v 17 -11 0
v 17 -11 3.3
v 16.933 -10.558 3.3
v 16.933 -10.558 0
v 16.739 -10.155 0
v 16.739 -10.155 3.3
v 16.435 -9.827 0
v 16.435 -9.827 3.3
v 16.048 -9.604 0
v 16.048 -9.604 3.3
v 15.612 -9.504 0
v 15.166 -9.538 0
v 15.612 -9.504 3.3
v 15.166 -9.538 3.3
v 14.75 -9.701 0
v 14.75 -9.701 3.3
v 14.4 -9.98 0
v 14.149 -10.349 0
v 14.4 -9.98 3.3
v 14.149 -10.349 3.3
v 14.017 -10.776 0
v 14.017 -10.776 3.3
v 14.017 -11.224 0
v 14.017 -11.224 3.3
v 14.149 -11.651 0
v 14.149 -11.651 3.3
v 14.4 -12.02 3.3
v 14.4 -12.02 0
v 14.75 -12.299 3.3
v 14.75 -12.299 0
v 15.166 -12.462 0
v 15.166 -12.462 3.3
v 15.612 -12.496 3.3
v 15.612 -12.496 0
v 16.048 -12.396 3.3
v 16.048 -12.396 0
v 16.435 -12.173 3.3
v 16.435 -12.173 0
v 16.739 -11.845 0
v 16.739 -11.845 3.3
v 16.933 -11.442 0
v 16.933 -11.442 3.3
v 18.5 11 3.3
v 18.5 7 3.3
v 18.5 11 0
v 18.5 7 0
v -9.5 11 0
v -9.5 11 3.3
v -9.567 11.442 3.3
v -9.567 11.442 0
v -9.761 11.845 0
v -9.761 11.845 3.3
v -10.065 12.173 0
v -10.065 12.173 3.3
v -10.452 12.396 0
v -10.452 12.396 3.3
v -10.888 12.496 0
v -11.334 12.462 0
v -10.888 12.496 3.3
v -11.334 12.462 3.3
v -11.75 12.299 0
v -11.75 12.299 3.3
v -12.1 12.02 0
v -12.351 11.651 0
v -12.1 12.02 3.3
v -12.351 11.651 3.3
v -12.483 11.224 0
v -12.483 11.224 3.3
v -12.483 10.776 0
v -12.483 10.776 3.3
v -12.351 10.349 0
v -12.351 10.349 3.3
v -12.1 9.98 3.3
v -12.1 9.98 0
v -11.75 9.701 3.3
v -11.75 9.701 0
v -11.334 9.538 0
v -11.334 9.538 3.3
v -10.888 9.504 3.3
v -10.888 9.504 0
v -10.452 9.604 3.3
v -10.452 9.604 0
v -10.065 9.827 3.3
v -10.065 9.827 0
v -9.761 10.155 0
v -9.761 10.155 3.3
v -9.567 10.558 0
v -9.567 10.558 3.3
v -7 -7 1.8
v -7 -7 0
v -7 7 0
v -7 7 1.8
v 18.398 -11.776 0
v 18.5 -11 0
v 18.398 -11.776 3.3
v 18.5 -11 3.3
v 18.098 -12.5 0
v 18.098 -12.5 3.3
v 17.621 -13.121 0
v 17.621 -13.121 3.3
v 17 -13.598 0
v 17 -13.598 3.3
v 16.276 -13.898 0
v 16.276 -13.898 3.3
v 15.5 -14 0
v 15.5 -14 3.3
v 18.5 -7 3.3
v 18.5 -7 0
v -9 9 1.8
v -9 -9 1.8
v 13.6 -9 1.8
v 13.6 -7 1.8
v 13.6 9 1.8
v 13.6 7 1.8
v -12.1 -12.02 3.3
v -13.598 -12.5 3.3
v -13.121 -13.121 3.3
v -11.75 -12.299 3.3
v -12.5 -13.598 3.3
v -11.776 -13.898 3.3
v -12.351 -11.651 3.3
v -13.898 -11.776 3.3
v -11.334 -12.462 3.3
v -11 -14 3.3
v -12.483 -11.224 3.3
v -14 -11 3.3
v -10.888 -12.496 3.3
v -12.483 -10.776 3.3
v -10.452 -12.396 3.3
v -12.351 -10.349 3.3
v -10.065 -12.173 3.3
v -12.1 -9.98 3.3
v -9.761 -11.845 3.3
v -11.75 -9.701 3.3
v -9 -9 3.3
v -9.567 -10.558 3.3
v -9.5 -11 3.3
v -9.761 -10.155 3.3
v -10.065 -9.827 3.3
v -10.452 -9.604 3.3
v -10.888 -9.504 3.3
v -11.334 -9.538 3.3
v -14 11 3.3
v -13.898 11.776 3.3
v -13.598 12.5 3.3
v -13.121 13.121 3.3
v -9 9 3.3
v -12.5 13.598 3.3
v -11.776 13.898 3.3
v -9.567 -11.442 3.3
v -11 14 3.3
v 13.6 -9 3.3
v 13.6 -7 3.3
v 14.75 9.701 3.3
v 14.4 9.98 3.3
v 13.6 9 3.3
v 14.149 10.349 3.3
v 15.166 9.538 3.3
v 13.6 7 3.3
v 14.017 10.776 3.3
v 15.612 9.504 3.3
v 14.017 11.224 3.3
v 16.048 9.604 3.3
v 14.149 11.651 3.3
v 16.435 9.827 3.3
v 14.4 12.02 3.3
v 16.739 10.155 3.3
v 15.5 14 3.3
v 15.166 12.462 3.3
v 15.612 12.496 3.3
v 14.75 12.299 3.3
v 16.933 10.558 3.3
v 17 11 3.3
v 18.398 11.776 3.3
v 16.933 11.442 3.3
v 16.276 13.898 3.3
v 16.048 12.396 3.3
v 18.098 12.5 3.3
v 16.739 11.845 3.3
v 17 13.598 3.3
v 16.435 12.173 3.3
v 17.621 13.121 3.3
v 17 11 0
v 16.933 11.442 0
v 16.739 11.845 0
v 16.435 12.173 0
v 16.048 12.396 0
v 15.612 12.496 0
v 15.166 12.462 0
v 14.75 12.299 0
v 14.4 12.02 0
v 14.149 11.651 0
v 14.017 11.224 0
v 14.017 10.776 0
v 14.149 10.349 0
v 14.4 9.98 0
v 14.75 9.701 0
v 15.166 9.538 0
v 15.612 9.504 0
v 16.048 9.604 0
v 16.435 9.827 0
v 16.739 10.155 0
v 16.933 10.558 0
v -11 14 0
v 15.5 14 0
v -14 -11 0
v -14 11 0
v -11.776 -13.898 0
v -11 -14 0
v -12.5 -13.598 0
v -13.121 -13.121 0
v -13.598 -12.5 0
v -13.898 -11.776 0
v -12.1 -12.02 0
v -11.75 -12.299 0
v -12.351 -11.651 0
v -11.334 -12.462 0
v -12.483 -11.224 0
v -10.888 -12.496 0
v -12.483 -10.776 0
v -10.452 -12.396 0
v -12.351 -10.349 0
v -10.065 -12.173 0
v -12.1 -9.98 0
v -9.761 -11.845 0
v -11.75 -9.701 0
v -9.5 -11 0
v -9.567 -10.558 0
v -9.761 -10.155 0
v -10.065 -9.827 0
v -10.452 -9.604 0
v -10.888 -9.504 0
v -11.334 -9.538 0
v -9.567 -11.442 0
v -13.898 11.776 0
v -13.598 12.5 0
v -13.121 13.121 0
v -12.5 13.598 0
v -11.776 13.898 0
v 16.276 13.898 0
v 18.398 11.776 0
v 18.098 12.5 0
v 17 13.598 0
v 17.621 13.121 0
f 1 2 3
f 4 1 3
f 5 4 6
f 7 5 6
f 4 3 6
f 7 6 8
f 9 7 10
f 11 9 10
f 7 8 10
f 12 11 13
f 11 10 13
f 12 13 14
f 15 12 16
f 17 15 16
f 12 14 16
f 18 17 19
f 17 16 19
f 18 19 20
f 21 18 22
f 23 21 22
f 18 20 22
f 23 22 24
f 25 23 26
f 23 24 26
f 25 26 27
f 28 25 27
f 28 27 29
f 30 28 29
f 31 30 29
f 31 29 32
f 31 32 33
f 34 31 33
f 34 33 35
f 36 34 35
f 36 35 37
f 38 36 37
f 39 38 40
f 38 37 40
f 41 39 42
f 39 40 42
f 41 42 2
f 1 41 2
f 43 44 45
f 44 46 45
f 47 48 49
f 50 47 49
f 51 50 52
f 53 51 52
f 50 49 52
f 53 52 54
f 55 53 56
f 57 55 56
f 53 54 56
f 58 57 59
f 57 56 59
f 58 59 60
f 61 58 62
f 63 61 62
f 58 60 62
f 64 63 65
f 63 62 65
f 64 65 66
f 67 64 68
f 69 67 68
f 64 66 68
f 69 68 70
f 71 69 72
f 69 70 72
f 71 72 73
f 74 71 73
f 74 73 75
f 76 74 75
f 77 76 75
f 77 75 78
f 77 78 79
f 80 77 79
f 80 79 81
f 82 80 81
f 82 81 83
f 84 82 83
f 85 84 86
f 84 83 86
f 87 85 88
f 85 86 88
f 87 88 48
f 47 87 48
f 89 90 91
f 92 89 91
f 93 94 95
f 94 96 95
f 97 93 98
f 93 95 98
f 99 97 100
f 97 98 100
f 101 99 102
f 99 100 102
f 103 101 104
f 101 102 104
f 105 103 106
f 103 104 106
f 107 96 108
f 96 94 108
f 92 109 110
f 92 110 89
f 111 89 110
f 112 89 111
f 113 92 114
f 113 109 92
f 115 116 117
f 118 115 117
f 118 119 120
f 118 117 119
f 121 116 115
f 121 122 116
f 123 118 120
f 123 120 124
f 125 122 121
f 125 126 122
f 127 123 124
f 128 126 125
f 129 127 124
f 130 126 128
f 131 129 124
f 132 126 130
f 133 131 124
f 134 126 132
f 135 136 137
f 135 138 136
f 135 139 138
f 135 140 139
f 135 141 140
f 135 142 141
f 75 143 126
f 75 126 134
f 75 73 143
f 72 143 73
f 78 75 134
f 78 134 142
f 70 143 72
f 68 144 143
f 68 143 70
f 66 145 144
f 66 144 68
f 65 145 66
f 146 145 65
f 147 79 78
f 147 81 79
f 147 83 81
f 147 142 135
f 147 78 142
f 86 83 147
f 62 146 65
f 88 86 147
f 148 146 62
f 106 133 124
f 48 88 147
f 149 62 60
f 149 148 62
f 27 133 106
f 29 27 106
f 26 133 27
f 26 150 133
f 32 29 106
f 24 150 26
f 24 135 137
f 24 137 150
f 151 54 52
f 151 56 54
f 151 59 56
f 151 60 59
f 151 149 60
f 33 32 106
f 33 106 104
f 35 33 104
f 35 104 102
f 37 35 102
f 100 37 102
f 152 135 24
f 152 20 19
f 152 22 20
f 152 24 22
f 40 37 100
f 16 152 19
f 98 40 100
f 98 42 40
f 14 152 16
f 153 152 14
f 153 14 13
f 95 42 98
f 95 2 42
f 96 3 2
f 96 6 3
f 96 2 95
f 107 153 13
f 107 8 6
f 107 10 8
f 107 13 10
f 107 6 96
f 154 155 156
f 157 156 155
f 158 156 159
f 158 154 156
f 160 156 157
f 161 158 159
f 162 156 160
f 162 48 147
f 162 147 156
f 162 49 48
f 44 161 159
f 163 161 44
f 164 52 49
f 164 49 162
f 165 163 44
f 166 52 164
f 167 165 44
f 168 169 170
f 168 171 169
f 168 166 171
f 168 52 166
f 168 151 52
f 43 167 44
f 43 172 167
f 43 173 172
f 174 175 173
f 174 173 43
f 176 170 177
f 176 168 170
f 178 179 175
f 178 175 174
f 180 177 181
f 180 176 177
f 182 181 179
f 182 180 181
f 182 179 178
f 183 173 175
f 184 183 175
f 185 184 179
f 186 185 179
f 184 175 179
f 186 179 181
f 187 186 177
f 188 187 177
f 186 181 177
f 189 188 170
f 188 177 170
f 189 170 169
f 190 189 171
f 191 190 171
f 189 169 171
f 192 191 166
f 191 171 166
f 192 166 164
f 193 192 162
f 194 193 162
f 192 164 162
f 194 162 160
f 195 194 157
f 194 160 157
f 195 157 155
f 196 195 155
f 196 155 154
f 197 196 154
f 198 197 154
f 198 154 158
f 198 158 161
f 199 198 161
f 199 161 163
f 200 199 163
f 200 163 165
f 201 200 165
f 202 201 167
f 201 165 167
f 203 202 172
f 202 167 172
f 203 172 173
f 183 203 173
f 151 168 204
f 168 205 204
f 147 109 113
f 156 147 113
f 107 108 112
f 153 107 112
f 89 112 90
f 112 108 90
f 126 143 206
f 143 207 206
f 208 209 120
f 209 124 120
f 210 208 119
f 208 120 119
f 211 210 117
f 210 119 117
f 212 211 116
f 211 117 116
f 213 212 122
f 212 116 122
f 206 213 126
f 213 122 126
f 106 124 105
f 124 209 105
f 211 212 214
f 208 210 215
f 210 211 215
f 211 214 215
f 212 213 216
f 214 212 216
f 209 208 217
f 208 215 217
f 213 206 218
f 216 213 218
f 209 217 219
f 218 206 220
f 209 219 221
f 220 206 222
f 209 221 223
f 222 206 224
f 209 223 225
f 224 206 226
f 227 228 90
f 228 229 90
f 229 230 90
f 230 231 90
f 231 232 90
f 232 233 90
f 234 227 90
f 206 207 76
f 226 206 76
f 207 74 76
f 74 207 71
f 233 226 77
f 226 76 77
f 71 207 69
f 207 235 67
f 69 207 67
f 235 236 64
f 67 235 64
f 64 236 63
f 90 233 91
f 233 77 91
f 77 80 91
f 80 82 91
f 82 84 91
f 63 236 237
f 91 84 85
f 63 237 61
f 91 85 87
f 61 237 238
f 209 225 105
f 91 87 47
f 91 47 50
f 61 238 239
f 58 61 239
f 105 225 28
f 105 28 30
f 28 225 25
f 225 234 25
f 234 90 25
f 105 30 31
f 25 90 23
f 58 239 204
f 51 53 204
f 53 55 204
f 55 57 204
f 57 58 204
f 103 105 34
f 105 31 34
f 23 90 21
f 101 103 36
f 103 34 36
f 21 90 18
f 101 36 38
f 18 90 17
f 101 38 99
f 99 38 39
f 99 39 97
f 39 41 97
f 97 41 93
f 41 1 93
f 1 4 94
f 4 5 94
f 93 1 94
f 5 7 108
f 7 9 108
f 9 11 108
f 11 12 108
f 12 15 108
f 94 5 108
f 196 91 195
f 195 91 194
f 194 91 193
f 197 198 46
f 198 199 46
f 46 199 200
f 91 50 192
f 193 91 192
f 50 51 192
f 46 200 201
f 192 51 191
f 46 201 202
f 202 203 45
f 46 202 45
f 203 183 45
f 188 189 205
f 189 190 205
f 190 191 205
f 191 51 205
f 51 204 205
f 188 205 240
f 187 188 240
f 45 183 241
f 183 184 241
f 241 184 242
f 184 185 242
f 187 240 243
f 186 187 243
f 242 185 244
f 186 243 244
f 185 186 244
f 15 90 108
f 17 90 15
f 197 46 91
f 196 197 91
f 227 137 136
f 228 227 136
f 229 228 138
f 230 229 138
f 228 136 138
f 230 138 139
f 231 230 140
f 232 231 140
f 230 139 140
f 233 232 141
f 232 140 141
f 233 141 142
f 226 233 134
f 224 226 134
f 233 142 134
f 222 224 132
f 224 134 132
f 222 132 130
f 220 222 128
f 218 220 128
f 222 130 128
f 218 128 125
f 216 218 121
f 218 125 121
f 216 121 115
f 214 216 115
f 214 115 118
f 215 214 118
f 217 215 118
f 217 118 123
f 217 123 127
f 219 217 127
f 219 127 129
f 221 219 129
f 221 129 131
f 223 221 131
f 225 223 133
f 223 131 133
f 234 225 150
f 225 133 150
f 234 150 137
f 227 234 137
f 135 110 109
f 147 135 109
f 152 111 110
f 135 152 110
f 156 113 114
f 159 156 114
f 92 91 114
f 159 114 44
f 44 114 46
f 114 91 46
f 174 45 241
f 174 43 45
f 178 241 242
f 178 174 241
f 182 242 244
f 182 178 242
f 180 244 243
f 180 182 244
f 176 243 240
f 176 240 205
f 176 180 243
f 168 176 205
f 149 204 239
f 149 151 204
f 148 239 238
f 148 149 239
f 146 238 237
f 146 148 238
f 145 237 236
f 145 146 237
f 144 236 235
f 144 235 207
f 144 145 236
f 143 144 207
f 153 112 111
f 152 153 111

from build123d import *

# Parameters (mm, degrees)
F1_DEPTH = 1.8
F3_DEPTH = 1.5
F4_R     = 1.5
F5_DEPTH = 3.3
F6_R     = 3


with BuildPart() as f1:
    # F0 (on Top) → F1 (new body)
    with BuildSketch(Plane.XY):
        Polygon((18.5, 14), (-14, 14), (-14, -14), (18.5, -14), (18.5, -7), (-7, -7), (-7, 7), (18.5, 7), align=None)
    extrude(amount=F1_DEPTH)

    # F2 (on face) → F3 (join)
    with BuildSketch(Plane.XY.offset(1.8)):
        Polygon((-9, -9), (-9, 9), (13.6, 9), (13.6, 7), (18.5, 7), (18.5, 14), (-14, 14), (-14, -14), (18.5, -14), (18.5, -7), (13.6, -7), (13.6, -9), align=None)
    extrude(amount=F3_DEPTH)

    # F4 (on face) → F5 (cut, through all)
    with BuildSketch(Plane.XY.offset(3.3)):
        with Locations((-11, 11)):
            Circle(F4_R)
        with Locations((15.5, 11)):
            Circle(F4_R)
        with Locations((15.5, -11)):
            Circle(F4_R)
        with Locations((-11, -11)):
            Circle(F4_R)
    extrude(amount=-F5_DEPTH, mode=Mode.SUBTRACT)

    # F6
    f6_edges = [f1.edges().sort_by_distance(p)[0] for p in [
        (-14, -14, 1.65),
        (18.5, -14, 1.65),
        (18.5, 14, 1.65),
        (-14, 14, 1.65),
    ]]
    fillet(f6_edges, radius=F6_R)


solid = f1.part
